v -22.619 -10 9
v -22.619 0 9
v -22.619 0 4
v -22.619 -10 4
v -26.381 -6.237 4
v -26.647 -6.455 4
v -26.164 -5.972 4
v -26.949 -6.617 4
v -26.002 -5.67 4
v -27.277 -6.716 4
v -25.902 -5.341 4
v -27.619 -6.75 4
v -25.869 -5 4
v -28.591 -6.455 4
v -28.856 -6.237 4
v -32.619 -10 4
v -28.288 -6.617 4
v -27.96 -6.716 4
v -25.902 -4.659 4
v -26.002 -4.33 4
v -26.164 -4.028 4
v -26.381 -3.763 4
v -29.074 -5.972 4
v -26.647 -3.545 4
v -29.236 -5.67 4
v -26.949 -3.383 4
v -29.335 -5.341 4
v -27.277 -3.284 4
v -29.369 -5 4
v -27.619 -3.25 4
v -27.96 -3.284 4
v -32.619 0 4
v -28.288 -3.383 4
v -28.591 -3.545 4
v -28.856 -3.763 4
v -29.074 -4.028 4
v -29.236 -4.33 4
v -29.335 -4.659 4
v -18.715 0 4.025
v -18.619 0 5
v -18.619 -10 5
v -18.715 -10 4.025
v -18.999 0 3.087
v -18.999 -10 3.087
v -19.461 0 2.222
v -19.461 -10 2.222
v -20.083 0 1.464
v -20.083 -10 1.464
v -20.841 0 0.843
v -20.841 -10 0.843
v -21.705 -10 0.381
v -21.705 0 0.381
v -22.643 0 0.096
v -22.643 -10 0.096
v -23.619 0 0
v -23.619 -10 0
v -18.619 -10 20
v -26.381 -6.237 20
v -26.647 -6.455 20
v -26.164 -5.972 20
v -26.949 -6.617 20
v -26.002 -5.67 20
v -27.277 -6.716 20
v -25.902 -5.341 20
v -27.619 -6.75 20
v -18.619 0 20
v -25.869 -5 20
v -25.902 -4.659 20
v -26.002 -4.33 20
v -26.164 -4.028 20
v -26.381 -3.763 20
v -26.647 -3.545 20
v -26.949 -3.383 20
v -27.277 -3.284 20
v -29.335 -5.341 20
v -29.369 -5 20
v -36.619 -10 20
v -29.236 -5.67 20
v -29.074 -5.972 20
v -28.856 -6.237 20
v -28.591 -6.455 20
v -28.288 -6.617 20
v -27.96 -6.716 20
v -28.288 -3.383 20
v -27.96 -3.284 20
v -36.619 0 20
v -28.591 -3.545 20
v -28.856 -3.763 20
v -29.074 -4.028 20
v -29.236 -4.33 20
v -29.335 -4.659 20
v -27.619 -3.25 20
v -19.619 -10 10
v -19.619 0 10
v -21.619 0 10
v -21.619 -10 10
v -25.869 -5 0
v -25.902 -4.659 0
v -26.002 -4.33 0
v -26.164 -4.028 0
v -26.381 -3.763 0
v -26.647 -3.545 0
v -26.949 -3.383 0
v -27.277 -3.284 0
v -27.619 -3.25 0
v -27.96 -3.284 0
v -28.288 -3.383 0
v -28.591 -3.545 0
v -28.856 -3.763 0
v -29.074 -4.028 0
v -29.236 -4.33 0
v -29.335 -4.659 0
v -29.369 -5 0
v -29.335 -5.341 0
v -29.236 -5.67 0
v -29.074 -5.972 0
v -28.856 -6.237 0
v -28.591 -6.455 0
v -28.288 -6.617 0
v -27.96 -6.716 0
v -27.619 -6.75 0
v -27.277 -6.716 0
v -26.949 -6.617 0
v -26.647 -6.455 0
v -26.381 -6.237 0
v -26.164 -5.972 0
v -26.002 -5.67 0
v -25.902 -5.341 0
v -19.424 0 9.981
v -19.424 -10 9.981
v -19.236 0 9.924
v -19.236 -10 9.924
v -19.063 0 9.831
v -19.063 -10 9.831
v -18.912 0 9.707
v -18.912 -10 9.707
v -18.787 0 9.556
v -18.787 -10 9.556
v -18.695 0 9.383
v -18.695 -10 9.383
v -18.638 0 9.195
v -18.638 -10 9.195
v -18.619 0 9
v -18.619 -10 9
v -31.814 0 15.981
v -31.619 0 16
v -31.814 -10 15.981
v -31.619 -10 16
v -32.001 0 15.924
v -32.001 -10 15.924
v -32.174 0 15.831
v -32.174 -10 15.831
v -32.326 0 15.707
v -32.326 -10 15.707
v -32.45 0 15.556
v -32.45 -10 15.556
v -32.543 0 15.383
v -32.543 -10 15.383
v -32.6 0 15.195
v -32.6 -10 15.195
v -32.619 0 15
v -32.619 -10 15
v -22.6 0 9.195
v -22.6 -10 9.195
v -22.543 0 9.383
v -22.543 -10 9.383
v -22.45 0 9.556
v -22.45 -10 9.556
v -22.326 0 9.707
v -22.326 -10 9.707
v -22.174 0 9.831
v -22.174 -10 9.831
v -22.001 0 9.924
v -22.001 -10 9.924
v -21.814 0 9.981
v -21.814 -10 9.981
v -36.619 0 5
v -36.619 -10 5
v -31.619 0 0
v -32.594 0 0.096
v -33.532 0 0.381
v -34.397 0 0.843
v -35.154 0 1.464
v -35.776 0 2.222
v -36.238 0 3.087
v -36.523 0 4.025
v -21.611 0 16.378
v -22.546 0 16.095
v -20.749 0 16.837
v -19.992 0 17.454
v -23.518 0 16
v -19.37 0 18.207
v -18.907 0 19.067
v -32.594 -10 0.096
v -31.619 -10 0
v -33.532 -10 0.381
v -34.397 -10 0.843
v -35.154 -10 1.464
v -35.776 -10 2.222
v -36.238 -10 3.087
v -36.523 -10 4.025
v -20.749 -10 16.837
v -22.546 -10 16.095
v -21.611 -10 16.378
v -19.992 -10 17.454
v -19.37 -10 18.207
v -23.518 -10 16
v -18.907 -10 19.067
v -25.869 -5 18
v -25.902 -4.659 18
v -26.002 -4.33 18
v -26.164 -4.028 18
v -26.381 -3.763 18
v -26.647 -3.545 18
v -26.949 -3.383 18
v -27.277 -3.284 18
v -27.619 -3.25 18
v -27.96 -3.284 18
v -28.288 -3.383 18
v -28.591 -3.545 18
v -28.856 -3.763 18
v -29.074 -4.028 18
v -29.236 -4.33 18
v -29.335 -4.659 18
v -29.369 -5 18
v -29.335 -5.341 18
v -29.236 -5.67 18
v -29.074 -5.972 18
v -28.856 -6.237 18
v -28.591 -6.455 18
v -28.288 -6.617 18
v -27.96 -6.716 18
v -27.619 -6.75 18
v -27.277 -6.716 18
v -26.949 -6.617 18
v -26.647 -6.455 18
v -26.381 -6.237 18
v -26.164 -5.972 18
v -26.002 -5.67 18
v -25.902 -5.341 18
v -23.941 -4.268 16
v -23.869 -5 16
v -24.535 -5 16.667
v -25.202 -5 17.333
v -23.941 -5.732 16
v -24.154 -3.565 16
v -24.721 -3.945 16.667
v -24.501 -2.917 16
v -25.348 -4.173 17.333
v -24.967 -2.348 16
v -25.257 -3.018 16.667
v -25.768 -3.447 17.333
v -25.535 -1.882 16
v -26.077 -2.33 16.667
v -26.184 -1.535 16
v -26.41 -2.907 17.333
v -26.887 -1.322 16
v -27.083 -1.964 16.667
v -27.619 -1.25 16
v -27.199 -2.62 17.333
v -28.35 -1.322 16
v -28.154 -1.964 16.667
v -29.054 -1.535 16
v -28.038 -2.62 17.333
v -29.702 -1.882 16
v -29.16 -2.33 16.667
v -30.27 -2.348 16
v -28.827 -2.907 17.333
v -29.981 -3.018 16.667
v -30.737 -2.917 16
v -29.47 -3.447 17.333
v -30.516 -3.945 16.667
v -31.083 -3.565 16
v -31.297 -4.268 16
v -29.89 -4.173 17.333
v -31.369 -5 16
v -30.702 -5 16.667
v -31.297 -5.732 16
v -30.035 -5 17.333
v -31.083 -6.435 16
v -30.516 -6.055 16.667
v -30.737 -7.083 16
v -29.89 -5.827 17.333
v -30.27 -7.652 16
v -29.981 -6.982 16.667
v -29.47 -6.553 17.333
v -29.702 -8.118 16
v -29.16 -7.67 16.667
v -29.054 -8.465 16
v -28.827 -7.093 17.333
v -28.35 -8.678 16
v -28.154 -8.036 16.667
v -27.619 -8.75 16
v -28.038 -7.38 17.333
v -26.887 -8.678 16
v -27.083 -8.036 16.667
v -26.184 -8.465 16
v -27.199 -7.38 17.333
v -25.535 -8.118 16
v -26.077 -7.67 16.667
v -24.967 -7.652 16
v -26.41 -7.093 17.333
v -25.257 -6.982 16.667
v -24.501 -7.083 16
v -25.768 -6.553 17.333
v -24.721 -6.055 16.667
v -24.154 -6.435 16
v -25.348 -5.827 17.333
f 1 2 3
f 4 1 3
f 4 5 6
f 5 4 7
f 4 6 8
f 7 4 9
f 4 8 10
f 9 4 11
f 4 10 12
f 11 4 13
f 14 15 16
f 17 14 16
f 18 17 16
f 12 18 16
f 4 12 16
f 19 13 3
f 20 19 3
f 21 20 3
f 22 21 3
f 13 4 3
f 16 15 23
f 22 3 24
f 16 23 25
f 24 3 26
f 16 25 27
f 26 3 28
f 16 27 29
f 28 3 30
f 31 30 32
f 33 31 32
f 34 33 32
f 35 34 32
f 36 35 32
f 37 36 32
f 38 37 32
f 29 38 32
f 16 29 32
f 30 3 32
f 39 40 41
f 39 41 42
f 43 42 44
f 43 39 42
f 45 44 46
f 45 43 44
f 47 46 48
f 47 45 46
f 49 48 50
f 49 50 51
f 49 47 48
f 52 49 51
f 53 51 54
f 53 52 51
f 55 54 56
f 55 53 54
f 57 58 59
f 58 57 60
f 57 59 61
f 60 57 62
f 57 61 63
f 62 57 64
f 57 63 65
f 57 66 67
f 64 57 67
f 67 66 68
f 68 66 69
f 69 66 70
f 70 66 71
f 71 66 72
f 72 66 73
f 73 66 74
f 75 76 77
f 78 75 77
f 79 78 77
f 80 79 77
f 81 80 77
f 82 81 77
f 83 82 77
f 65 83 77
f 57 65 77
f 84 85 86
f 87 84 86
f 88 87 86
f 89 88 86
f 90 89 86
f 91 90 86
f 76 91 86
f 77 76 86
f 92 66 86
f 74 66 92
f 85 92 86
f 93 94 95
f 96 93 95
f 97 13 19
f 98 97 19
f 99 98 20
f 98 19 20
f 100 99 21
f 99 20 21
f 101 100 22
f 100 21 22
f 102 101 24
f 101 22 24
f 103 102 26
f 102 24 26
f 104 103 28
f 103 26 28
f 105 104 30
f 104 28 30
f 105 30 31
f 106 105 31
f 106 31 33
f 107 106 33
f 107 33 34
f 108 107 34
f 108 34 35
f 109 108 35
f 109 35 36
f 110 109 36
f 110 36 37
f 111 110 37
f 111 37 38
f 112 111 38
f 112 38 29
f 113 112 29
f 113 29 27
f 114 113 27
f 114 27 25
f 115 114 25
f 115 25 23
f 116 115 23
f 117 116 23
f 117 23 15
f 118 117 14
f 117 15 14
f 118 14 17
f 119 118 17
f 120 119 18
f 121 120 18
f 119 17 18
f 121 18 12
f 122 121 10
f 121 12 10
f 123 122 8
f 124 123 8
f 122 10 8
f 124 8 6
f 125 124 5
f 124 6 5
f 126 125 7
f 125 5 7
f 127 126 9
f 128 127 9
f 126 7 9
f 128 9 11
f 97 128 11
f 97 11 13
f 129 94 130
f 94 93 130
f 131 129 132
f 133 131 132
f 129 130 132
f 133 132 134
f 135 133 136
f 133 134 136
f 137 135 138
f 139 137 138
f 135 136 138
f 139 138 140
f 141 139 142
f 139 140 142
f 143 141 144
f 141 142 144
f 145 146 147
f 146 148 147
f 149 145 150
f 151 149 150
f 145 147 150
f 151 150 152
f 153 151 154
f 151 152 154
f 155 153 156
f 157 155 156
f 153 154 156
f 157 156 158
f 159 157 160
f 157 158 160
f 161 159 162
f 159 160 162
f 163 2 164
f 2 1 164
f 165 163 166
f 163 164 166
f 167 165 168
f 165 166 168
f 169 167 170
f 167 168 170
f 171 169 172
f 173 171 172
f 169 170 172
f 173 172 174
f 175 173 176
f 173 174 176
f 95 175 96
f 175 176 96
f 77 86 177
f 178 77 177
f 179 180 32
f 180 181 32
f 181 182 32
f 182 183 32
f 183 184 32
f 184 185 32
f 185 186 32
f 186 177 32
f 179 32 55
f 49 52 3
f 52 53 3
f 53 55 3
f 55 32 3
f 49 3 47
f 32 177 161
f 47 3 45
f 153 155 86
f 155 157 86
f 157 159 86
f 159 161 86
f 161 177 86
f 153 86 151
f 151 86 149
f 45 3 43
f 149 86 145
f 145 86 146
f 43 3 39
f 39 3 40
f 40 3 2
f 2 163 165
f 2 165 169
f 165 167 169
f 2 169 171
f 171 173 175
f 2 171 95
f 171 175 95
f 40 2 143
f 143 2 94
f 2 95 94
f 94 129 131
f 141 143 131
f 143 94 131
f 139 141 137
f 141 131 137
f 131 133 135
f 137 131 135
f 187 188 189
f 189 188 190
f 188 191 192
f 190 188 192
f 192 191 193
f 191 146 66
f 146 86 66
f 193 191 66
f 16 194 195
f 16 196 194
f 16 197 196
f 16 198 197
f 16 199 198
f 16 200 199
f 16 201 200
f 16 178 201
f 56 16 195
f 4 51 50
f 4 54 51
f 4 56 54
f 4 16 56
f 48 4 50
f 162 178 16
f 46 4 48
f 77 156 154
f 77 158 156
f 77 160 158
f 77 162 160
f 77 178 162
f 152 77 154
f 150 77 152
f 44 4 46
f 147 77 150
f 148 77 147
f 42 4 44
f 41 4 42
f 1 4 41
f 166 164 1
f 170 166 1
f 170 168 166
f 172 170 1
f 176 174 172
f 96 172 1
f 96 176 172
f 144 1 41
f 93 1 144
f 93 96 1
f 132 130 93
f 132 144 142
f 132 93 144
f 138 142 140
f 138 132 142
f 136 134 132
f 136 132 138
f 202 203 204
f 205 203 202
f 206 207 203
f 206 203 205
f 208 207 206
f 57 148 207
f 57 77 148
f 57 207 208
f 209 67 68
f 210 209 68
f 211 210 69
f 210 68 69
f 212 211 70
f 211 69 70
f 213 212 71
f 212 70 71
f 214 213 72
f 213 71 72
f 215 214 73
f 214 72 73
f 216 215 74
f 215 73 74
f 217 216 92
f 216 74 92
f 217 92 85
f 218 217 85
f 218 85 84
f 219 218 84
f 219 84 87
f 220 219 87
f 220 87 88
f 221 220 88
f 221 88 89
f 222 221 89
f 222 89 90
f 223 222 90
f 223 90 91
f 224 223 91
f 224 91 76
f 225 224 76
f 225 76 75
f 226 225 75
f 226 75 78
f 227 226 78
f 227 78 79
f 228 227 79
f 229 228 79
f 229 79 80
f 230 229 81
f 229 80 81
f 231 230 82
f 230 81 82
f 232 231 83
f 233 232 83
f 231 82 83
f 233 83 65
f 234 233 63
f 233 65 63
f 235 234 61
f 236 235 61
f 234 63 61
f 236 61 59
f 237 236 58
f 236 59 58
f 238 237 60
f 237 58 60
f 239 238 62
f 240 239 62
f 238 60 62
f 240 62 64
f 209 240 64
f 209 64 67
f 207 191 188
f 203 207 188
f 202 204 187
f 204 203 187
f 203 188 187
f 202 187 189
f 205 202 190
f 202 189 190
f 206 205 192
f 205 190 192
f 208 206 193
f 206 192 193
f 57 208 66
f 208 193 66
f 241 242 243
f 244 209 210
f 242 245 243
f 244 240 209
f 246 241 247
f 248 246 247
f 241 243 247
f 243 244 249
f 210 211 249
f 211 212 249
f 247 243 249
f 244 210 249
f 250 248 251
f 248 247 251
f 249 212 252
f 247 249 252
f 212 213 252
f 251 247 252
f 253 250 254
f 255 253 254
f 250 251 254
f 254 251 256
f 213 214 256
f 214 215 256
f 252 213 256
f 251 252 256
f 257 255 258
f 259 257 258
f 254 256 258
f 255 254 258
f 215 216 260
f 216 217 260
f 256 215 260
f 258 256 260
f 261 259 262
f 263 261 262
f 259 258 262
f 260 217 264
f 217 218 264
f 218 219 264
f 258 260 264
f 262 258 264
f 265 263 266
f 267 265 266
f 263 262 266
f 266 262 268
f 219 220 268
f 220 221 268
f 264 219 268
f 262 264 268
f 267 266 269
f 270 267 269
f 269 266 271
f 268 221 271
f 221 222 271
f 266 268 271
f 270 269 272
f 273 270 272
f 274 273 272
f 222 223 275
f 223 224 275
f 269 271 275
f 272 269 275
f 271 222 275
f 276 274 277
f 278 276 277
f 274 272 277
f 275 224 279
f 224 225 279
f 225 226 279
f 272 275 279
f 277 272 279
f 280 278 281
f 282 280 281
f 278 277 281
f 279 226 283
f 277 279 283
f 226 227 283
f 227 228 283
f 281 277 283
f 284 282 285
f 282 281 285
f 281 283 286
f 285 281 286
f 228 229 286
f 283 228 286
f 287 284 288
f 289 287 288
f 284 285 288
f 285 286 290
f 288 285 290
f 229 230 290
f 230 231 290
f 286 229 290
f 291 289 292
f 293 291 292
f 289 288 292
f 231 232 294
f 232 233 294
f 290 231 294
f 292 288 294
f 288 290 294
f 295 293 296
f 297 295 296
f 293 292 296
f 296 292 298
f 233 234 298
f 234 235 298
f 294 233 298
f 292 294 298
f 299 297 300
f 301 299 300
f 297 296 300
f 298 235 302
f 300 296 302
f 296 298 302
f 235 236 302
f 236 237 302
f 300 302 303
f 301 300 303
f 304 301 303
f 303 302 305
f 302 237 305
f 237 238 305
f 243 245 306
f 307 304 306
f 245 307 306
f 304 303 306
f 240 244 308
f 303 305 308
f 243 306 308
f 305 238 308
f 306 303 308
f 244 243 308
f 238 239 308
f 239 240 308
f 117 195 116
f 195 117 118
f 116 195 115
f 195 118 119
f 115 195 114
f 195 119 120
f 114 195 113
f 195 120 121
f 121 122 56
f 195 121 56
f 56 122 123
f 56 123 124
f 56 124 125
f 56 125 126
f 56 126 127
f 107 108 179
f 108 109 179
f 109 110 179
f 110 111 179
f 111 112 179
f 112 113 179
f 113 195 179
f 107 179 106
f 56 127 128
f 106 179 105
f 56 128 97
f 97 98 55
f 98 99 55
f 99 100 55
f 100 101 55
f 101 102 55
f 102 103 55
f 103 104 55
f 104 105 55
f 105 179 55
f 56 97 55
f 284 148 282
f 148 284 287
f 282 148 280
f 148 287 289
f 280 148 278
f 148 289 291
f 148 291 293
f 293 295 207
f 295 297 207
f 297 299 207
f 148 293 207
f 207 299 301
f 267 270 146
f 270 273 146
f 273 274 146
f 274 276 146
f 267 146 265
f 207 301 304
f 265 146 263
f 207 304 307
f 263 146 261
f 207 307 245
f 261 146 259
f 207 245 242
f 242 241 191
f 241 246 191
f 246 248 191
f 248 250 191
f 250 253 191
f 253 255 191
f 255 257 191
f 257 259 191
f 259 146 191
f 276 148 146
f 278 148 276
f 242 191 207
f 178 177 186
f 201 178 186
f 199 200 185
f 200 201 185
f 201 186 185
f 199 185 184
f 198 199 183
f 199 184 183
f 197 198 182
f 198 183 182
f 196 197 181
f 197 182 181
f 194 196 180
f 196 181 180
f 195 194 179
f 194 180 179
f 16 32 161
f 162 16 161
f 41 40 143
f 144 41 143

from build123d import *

# Parameters (mm, degrees)
F1_DEPTH    = 10
F2_T1_DEPTH = 34.4948974279
F2_T3_DEPTH = 35
F3_R        = 1
F4_R        = 1.75
F5_DEPTH    = 20.001
F6_SIZE     = 2


# Not quite as in the source:
# - a fillet or chamfer that OpenCascade refuses, or shapes differently, is made with other operations: its cross-section is extruded or revolved along the edge and cut away or added


with BuildPart() as f1:
    # F0 (on Front) → F1 (new body)
    with BuildSketch(Plane.XZ):
        Polygon((-18.6188016892, 16), (-18.6188016892, 20), (-36.6188016892, 20), (-36.6188016892, 0), (-18.6188016892, 0), (-18.6188016892, 10), (-22.6188016892, 10), (-22.6188016892, 4), (-32.6188016892, 4), (-32.6188016892, 16), align=None)
    extrude(amount=F1_DEPTH)

    # F2: fillet of radius 5 on 3 edges, made by hand

    # F2_s2 → F2_t1 (cut)
    with BuildSketch(Plane.XZ.offset(-12.2474487139)):
        with BuildLine():
            ThreePointArc((-23.5177811747, 16), (-20.3555035146, 17.1270166538), (-18.6188016892, 20))
            Line((-18.6188016892, 20), (-18.6188016892, 16))
            Line((-18.6188016892, 16), (-23.5177811747, 16))
        make_face()
    extrude(amount=F2_T1_DEPTH, mode=Mode.SUBTRACT)

    # F2_s4 → F2_t3 (cut)
    with BuildSketch(Plane.XZ.offset(-12.5)):
        with BuildLine():
            ThreePointArc((-18.6188016892, 5), (-20.0832677832, 1.4644660941), (-23.6188016892, 0))
            Line((-23.6188016892, 0), (-18.6188016892, 0))
            Line((-18.6188016892, 0), (-18.6188016892, 5))
        make_face()
        with BuildLine():
            ThreePointArc((-36.6188016892, 5), (-35.1543355951, 1.4644660941), (-31.6188016892, 0))
            Line((-31.6188016892, 0), (-36.6188016892, 0))
            Line((-36.6188016892, 0), (-36.6188016892, 5))
        make_face()
    extrude(amount=F2_T3_DEPTH, mode=Mode.SUBTRACT)

    # F3
    f3_edges = [f1.edges().sort_by_distance(p)[0] for p in [
        (-18.618802, -5, 10),
        (-22.618802, -5, 10),
        (-32.618802, -5, 16),
    ]]
    fillet(f3_edges, radius=F3_R)

    # F4 (on face) → F5 (cut, through all)
    with BuildSketch(Plane.XY.offset(20)):
        with Locations((-27.6188016892, -5)):
            Circle(F4_R)
    extrude(amount=-F5_DEPTH, mode=Mode.SUBTRACT)

    # F6
    f6_edges = [f1.edges().sort_by_distance(p)[0] for p in [
        (-29.368802, -5, 16),
    ]]
    chamfer(f6_edges, length=F6_SIZE)


solid = f1.part
